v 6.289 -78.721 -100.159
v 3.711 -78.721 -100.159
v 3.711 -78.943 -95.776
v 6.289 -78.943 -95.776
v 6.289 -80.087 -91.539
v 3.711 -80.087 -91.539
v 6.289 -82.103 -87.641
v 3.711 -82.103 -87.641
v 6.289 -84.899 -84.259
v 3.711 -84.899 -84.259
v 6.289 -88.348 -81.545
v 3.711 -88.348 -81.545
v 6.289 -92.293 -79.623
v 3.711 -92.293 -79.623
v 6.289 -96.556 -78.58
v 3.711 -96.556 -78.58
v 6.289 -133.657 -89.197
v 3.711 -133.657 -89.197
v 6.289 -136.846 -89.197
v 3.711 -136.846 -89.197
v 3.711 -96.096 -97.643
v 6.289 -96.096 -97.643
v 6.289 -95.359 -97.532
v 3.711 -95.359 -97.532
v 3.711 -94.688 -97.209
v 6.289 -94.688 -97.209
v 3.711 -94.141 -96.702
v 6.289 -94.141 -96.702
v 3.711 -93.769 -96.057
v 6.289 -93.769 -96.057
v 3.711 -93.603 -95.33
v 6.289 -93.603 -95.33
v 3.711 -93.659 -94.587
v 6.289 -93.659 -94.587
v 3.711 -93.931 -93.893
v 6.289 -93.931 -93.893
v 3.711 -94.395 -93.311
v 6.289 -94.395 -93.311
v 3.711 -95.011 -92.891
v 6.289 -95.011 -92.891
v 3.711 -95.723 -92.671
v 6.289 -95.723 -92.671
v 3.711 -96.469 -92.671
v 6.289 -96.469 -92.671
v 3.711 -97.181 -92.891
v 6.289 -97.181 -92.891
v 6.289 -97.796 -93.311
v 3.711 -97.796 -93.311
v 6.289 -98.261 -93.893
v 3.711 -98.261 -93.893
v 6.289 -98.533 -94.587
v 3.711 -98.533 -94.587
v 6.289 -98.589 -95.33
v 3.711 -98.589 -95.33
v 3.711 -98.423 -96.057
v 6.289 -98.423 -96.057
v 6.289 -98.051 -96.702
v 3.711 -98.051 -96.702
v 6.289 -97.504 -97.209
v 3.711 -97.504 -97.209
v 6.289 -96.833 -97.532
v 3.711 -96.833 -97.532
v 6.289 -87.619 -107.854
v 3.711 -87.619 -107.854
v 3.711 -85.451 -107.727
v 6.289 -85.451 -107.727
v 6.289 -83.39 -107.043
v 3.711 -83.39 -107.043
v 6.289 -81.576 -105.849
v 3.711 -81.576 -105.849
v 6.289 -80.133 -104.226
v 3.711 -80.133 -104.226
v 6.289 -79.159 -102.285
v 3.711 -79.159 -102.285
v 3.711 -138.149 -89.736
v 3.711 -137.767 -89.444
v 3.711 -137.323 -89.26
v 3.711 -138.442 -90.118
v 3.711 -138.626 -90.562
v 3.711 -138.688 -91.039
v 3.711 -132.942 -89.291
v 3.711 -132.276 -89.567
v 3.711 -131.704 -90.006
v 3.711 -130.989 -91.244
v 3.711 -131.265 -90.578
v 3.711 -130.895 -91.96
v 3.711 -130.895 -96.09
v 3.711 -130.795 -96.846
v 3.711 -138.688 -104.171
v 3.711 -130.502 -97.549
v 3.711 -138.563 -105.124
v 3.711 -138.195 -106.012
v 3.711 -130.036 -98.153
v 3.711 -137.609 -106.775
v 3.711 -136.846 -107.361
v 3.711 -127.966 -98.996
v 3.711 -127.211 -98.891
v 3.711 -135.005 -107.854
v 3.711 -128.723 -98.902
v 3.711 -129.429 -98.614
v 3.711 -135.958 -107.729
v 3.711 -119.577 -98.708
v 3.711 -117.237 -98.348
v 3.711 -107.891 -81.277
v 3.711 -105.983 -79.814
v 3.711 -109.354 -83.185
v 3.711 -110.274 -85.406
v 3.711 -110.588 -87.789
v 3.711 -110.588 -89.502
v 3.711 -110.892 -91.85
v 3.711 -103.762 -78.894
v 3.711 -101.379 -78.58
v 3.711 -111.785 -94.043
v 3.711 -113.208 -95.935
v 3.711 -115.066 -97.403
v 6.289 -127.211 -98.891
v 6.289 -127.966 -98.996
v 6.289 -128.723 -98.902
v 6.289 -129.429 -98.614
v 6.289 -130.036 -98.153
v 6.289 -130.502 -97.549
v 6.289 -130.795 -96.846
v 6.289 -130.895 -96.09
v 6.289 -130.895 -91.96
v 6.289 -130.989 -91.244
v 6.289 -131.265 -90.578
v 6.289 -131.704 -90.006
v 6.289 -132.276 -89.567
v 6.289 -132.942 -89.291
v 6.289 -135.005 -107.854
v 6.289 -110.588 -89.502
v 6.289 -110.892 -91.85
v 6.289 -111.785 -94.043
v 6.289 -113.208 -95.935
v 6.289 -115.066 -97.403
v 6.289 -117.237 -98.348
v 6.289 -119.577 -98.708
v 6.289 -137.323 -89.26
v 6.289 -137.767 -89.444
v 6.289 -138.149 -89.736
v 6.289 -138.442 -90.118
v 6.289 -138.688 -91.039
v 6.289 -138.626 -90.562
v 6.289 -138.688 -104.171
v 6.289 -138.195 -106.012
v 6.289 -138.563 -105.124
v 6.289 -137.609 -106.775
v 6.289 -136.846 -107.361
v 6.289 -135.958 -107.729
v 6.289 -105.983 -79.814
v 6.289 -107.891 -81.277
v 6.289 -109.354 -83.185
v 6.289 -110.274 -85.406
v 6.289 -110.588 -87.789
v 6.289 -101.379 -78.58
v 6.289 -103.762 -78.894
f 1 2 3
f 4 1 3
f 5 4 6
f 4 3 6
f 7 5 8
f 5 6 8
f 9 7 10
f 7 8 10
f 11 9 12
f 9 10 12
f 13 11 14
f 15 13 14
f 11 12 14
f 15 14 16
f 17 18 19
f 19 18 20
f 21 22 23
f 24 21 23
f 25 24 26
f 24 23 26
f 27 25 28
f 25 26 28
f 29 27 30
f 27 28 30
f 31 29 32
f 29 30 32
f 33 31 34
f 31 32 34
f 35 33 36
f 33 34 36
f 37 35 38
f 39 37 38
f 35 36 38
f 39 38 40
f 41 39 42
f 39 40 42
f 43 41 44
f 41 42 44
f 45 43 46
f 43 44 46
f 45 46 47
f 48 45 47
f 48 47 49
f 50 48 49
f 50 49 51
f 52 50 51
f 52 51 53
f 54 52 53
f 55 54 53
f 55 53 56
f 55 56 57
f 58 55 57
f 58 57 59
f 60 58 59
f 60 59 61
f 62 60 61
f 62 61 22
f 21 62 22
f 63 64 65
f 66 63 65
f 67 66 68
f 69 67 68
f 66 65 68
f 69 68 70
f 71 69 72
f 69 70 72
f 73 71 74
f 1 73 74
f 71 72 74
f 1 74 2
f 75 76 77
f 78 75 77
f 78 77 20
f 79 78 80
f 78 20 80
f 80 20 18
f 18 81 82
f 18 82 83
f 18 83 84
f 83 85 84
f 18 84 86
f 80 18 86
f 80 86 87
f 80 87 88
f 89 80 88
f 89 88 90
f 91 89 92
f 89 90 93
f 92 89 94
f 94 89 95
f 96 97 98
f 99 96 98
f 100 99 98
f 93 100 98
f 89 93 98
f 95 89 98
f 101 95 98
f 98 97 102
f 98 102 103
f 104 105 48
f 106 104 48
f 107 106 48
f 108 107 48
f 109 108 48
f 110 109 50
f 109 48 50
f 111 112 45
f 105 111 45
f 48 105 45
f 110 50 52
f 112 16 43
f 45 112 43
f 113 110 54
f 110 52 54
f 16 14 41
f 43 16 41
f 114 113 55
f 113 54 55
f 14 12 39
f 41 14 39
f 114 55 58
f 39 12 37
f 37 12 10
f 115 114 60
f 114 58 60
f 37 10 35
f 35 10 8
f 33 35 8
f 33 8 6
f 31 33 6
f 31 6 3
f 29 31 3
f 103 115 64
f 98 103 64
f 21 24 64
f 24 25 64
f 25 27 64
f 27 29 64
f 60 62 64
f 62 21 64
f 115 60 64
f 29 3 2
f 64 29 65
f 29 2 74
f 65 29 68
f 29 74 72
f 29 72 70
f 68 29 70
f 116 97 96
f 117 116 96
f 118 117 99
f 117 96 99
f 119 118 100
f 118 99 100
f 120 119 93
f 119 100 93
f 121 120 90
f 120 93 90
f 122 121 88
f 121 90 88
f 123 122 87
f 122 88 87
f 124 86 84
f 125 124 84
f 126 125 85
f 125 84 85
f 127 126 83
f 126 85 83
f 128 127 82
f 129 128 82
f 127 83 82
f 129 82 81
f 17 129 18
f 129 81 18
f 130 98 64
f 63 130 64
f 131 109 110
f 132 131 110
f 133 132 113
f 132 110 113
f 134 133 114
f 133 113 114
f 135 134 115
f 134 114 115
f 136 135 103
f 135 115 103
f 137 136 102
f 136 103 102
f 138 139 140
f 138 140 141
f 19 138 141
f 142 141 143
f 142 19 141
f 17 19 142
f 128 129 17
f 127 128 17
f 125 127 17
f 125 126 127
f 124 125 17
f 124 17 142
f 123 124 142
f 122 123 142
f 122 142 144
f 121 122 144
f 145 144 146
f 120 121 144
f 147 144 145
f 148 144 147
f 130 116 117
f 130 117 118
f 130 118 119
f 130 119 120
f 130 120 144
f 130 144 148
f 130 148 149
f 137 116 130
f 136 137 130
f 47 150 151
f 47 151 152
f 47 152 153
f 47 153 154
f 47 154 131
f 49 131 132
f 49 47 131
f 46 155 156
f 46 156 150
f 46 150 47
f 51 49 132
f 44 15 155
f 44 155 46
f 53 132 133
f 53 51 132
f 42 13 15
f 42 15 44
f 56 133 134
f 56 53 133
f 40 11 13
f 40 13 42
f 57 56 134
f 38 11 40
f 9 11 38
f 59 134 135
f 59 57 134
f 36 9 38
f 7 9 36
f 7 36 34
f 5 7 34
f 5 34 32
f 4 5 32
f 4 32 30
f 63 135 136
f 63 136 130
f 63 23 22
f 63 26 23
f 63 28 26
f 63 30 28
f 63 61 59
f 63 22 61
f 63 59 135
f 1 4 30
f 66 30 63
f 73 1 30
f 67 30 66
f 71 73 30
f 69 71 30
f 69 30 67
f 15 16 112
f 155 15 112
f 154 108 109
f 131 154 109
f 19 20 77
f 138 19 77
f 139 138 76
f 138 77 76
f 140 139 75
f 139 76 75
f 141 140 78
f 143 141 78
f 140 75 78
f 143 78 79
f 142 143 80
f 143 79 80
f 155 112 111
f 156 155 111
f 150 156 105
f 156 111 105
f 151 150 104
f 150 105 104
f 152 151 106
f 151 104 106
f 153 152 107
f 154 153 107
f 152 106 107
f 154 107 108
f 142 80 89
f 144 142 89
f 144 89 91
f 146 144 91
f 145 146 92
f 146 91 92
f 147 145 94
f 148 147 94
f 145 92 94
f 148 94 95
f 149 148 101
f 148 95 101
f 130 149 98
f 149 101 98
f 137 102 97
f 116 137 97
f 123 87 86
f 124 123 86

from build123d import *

# Parameters (mm, degrees)
BOSS_EXTRUDE1_DEPTH      = 12
BOSS_EXTRUDE1_DEPTH_BACK = 2
SCALE1_SCALE             = 0.184184676
CUT_EXTRUDE1_REACH       = 177.722
SKETCH4_R                = 2.5


with BuildPart() as part:
    # Sketch3 → Boss-Extrude1 (new, two sides: drawn at the far end of the back side and taken through both)
    with BuildSketch(Plane(origin=(0, 0, 0), x_dir=(0, 0, -1), z_dir=(1, 0, 0)).offset(-BOSS_EXTRUDE1_DEPTH_BACK)):
        with BuildLine():
            Line((0, -60), (0, -86.184781703))
            ThreePointArc((0, -86.184781703), (14.644660941, -121.540120762), (50, -136.184781703))
            Line((50, -136.184781703), (59.297038535, -136.184781703))
            ThreePointArc((59.297038535, -136.184781703), (94.227856727, -150.409958986), (109.282791662, -184.991264087))
            Line((109.282791662, -184.991264087), (110.272400942, -226.437125049))
            ThreePointArc((110.272400942, -226.437125049), (107.627548101, -240.207635718), (95.065077273, -246.437125049))
            Line((95.065077273, -246.437125049), (72.641071037, -246.437125049))
            ThreePointArc((72.641071037, -246.437125049), (62.034469319, -250.830523332), (57.641071037, -261.437125049))
            Line((57.641071037, -261.437125049), (57.641071037, -278.751269833))
            ThreePointArc((57.641071037, -278.751269833), (60.570003225, -285.822337645), (67.641071037, -288.751269833))
            Line((67.641071037, -288.751269833), (116.127942723, -288.751269833))
            Line((116.127942723, -288.751269833), (138.939006392, -288.751269833))
            ThreePointArc((138.939006392, -288.751269833), (153.081142016, -282.893405456), (158.939006392, -268.751269833))
            Line((158.939006392, -268.751269833), (158.939006392, -146.184781703))
            Line((158.939006392, -146.184781703), (158.939006392, -50))
            Line((158.939006392, -50), (158.939006392, -11.480346054))
            ThreePointArc((158.939006392, -11.480346054), (148.053108697, 21.328755123), (117.156078712, 36.830801017))
            ThreePointArc((117.156078712, 36.830801017), (39.60735059, 11.368133348), (0, -60))
        make_face()
    extrude(amount=BOSS_EXTRUDE1_DEPTH + BOSS_EXTRUDE1_DEPTH_BACK)


with BuildPart() as part_1:
    # Scale1: scaled about (5, -104.808897059, -96.321000263)
    add(part.part.scale(SCALE1_SCALE).moved(Location((4.07907662, -85.504704312, -78.580148038))))

    # Sketch4 → Cut-Extrude1 (cut, up to next)
    with BuildSketch(Plane(origin=(6.289292732, 0, 0), x_dir=(0, 0, -1), z_dir=(1, 0, 0)), mode=Mode.PRIVATE) as cut_extrude1_sk1:
        with Locations((95.143312613, -96.09592734)):
            Circle(SKETCH4_R)
    cut_extrude1_tool1 = extrude(cut_extrude1_sk1.sketch, amount=-CUT_EXTRUDE1_REACH, mode=Mode.PRIVATE) & part_1.part
    add(cut_extrude1_tool1.solids().sort_by_distance((6.289293, -96.095927, -95.143313))[0], mode=Mode.SUBTRACT)


solid = part_1.part
